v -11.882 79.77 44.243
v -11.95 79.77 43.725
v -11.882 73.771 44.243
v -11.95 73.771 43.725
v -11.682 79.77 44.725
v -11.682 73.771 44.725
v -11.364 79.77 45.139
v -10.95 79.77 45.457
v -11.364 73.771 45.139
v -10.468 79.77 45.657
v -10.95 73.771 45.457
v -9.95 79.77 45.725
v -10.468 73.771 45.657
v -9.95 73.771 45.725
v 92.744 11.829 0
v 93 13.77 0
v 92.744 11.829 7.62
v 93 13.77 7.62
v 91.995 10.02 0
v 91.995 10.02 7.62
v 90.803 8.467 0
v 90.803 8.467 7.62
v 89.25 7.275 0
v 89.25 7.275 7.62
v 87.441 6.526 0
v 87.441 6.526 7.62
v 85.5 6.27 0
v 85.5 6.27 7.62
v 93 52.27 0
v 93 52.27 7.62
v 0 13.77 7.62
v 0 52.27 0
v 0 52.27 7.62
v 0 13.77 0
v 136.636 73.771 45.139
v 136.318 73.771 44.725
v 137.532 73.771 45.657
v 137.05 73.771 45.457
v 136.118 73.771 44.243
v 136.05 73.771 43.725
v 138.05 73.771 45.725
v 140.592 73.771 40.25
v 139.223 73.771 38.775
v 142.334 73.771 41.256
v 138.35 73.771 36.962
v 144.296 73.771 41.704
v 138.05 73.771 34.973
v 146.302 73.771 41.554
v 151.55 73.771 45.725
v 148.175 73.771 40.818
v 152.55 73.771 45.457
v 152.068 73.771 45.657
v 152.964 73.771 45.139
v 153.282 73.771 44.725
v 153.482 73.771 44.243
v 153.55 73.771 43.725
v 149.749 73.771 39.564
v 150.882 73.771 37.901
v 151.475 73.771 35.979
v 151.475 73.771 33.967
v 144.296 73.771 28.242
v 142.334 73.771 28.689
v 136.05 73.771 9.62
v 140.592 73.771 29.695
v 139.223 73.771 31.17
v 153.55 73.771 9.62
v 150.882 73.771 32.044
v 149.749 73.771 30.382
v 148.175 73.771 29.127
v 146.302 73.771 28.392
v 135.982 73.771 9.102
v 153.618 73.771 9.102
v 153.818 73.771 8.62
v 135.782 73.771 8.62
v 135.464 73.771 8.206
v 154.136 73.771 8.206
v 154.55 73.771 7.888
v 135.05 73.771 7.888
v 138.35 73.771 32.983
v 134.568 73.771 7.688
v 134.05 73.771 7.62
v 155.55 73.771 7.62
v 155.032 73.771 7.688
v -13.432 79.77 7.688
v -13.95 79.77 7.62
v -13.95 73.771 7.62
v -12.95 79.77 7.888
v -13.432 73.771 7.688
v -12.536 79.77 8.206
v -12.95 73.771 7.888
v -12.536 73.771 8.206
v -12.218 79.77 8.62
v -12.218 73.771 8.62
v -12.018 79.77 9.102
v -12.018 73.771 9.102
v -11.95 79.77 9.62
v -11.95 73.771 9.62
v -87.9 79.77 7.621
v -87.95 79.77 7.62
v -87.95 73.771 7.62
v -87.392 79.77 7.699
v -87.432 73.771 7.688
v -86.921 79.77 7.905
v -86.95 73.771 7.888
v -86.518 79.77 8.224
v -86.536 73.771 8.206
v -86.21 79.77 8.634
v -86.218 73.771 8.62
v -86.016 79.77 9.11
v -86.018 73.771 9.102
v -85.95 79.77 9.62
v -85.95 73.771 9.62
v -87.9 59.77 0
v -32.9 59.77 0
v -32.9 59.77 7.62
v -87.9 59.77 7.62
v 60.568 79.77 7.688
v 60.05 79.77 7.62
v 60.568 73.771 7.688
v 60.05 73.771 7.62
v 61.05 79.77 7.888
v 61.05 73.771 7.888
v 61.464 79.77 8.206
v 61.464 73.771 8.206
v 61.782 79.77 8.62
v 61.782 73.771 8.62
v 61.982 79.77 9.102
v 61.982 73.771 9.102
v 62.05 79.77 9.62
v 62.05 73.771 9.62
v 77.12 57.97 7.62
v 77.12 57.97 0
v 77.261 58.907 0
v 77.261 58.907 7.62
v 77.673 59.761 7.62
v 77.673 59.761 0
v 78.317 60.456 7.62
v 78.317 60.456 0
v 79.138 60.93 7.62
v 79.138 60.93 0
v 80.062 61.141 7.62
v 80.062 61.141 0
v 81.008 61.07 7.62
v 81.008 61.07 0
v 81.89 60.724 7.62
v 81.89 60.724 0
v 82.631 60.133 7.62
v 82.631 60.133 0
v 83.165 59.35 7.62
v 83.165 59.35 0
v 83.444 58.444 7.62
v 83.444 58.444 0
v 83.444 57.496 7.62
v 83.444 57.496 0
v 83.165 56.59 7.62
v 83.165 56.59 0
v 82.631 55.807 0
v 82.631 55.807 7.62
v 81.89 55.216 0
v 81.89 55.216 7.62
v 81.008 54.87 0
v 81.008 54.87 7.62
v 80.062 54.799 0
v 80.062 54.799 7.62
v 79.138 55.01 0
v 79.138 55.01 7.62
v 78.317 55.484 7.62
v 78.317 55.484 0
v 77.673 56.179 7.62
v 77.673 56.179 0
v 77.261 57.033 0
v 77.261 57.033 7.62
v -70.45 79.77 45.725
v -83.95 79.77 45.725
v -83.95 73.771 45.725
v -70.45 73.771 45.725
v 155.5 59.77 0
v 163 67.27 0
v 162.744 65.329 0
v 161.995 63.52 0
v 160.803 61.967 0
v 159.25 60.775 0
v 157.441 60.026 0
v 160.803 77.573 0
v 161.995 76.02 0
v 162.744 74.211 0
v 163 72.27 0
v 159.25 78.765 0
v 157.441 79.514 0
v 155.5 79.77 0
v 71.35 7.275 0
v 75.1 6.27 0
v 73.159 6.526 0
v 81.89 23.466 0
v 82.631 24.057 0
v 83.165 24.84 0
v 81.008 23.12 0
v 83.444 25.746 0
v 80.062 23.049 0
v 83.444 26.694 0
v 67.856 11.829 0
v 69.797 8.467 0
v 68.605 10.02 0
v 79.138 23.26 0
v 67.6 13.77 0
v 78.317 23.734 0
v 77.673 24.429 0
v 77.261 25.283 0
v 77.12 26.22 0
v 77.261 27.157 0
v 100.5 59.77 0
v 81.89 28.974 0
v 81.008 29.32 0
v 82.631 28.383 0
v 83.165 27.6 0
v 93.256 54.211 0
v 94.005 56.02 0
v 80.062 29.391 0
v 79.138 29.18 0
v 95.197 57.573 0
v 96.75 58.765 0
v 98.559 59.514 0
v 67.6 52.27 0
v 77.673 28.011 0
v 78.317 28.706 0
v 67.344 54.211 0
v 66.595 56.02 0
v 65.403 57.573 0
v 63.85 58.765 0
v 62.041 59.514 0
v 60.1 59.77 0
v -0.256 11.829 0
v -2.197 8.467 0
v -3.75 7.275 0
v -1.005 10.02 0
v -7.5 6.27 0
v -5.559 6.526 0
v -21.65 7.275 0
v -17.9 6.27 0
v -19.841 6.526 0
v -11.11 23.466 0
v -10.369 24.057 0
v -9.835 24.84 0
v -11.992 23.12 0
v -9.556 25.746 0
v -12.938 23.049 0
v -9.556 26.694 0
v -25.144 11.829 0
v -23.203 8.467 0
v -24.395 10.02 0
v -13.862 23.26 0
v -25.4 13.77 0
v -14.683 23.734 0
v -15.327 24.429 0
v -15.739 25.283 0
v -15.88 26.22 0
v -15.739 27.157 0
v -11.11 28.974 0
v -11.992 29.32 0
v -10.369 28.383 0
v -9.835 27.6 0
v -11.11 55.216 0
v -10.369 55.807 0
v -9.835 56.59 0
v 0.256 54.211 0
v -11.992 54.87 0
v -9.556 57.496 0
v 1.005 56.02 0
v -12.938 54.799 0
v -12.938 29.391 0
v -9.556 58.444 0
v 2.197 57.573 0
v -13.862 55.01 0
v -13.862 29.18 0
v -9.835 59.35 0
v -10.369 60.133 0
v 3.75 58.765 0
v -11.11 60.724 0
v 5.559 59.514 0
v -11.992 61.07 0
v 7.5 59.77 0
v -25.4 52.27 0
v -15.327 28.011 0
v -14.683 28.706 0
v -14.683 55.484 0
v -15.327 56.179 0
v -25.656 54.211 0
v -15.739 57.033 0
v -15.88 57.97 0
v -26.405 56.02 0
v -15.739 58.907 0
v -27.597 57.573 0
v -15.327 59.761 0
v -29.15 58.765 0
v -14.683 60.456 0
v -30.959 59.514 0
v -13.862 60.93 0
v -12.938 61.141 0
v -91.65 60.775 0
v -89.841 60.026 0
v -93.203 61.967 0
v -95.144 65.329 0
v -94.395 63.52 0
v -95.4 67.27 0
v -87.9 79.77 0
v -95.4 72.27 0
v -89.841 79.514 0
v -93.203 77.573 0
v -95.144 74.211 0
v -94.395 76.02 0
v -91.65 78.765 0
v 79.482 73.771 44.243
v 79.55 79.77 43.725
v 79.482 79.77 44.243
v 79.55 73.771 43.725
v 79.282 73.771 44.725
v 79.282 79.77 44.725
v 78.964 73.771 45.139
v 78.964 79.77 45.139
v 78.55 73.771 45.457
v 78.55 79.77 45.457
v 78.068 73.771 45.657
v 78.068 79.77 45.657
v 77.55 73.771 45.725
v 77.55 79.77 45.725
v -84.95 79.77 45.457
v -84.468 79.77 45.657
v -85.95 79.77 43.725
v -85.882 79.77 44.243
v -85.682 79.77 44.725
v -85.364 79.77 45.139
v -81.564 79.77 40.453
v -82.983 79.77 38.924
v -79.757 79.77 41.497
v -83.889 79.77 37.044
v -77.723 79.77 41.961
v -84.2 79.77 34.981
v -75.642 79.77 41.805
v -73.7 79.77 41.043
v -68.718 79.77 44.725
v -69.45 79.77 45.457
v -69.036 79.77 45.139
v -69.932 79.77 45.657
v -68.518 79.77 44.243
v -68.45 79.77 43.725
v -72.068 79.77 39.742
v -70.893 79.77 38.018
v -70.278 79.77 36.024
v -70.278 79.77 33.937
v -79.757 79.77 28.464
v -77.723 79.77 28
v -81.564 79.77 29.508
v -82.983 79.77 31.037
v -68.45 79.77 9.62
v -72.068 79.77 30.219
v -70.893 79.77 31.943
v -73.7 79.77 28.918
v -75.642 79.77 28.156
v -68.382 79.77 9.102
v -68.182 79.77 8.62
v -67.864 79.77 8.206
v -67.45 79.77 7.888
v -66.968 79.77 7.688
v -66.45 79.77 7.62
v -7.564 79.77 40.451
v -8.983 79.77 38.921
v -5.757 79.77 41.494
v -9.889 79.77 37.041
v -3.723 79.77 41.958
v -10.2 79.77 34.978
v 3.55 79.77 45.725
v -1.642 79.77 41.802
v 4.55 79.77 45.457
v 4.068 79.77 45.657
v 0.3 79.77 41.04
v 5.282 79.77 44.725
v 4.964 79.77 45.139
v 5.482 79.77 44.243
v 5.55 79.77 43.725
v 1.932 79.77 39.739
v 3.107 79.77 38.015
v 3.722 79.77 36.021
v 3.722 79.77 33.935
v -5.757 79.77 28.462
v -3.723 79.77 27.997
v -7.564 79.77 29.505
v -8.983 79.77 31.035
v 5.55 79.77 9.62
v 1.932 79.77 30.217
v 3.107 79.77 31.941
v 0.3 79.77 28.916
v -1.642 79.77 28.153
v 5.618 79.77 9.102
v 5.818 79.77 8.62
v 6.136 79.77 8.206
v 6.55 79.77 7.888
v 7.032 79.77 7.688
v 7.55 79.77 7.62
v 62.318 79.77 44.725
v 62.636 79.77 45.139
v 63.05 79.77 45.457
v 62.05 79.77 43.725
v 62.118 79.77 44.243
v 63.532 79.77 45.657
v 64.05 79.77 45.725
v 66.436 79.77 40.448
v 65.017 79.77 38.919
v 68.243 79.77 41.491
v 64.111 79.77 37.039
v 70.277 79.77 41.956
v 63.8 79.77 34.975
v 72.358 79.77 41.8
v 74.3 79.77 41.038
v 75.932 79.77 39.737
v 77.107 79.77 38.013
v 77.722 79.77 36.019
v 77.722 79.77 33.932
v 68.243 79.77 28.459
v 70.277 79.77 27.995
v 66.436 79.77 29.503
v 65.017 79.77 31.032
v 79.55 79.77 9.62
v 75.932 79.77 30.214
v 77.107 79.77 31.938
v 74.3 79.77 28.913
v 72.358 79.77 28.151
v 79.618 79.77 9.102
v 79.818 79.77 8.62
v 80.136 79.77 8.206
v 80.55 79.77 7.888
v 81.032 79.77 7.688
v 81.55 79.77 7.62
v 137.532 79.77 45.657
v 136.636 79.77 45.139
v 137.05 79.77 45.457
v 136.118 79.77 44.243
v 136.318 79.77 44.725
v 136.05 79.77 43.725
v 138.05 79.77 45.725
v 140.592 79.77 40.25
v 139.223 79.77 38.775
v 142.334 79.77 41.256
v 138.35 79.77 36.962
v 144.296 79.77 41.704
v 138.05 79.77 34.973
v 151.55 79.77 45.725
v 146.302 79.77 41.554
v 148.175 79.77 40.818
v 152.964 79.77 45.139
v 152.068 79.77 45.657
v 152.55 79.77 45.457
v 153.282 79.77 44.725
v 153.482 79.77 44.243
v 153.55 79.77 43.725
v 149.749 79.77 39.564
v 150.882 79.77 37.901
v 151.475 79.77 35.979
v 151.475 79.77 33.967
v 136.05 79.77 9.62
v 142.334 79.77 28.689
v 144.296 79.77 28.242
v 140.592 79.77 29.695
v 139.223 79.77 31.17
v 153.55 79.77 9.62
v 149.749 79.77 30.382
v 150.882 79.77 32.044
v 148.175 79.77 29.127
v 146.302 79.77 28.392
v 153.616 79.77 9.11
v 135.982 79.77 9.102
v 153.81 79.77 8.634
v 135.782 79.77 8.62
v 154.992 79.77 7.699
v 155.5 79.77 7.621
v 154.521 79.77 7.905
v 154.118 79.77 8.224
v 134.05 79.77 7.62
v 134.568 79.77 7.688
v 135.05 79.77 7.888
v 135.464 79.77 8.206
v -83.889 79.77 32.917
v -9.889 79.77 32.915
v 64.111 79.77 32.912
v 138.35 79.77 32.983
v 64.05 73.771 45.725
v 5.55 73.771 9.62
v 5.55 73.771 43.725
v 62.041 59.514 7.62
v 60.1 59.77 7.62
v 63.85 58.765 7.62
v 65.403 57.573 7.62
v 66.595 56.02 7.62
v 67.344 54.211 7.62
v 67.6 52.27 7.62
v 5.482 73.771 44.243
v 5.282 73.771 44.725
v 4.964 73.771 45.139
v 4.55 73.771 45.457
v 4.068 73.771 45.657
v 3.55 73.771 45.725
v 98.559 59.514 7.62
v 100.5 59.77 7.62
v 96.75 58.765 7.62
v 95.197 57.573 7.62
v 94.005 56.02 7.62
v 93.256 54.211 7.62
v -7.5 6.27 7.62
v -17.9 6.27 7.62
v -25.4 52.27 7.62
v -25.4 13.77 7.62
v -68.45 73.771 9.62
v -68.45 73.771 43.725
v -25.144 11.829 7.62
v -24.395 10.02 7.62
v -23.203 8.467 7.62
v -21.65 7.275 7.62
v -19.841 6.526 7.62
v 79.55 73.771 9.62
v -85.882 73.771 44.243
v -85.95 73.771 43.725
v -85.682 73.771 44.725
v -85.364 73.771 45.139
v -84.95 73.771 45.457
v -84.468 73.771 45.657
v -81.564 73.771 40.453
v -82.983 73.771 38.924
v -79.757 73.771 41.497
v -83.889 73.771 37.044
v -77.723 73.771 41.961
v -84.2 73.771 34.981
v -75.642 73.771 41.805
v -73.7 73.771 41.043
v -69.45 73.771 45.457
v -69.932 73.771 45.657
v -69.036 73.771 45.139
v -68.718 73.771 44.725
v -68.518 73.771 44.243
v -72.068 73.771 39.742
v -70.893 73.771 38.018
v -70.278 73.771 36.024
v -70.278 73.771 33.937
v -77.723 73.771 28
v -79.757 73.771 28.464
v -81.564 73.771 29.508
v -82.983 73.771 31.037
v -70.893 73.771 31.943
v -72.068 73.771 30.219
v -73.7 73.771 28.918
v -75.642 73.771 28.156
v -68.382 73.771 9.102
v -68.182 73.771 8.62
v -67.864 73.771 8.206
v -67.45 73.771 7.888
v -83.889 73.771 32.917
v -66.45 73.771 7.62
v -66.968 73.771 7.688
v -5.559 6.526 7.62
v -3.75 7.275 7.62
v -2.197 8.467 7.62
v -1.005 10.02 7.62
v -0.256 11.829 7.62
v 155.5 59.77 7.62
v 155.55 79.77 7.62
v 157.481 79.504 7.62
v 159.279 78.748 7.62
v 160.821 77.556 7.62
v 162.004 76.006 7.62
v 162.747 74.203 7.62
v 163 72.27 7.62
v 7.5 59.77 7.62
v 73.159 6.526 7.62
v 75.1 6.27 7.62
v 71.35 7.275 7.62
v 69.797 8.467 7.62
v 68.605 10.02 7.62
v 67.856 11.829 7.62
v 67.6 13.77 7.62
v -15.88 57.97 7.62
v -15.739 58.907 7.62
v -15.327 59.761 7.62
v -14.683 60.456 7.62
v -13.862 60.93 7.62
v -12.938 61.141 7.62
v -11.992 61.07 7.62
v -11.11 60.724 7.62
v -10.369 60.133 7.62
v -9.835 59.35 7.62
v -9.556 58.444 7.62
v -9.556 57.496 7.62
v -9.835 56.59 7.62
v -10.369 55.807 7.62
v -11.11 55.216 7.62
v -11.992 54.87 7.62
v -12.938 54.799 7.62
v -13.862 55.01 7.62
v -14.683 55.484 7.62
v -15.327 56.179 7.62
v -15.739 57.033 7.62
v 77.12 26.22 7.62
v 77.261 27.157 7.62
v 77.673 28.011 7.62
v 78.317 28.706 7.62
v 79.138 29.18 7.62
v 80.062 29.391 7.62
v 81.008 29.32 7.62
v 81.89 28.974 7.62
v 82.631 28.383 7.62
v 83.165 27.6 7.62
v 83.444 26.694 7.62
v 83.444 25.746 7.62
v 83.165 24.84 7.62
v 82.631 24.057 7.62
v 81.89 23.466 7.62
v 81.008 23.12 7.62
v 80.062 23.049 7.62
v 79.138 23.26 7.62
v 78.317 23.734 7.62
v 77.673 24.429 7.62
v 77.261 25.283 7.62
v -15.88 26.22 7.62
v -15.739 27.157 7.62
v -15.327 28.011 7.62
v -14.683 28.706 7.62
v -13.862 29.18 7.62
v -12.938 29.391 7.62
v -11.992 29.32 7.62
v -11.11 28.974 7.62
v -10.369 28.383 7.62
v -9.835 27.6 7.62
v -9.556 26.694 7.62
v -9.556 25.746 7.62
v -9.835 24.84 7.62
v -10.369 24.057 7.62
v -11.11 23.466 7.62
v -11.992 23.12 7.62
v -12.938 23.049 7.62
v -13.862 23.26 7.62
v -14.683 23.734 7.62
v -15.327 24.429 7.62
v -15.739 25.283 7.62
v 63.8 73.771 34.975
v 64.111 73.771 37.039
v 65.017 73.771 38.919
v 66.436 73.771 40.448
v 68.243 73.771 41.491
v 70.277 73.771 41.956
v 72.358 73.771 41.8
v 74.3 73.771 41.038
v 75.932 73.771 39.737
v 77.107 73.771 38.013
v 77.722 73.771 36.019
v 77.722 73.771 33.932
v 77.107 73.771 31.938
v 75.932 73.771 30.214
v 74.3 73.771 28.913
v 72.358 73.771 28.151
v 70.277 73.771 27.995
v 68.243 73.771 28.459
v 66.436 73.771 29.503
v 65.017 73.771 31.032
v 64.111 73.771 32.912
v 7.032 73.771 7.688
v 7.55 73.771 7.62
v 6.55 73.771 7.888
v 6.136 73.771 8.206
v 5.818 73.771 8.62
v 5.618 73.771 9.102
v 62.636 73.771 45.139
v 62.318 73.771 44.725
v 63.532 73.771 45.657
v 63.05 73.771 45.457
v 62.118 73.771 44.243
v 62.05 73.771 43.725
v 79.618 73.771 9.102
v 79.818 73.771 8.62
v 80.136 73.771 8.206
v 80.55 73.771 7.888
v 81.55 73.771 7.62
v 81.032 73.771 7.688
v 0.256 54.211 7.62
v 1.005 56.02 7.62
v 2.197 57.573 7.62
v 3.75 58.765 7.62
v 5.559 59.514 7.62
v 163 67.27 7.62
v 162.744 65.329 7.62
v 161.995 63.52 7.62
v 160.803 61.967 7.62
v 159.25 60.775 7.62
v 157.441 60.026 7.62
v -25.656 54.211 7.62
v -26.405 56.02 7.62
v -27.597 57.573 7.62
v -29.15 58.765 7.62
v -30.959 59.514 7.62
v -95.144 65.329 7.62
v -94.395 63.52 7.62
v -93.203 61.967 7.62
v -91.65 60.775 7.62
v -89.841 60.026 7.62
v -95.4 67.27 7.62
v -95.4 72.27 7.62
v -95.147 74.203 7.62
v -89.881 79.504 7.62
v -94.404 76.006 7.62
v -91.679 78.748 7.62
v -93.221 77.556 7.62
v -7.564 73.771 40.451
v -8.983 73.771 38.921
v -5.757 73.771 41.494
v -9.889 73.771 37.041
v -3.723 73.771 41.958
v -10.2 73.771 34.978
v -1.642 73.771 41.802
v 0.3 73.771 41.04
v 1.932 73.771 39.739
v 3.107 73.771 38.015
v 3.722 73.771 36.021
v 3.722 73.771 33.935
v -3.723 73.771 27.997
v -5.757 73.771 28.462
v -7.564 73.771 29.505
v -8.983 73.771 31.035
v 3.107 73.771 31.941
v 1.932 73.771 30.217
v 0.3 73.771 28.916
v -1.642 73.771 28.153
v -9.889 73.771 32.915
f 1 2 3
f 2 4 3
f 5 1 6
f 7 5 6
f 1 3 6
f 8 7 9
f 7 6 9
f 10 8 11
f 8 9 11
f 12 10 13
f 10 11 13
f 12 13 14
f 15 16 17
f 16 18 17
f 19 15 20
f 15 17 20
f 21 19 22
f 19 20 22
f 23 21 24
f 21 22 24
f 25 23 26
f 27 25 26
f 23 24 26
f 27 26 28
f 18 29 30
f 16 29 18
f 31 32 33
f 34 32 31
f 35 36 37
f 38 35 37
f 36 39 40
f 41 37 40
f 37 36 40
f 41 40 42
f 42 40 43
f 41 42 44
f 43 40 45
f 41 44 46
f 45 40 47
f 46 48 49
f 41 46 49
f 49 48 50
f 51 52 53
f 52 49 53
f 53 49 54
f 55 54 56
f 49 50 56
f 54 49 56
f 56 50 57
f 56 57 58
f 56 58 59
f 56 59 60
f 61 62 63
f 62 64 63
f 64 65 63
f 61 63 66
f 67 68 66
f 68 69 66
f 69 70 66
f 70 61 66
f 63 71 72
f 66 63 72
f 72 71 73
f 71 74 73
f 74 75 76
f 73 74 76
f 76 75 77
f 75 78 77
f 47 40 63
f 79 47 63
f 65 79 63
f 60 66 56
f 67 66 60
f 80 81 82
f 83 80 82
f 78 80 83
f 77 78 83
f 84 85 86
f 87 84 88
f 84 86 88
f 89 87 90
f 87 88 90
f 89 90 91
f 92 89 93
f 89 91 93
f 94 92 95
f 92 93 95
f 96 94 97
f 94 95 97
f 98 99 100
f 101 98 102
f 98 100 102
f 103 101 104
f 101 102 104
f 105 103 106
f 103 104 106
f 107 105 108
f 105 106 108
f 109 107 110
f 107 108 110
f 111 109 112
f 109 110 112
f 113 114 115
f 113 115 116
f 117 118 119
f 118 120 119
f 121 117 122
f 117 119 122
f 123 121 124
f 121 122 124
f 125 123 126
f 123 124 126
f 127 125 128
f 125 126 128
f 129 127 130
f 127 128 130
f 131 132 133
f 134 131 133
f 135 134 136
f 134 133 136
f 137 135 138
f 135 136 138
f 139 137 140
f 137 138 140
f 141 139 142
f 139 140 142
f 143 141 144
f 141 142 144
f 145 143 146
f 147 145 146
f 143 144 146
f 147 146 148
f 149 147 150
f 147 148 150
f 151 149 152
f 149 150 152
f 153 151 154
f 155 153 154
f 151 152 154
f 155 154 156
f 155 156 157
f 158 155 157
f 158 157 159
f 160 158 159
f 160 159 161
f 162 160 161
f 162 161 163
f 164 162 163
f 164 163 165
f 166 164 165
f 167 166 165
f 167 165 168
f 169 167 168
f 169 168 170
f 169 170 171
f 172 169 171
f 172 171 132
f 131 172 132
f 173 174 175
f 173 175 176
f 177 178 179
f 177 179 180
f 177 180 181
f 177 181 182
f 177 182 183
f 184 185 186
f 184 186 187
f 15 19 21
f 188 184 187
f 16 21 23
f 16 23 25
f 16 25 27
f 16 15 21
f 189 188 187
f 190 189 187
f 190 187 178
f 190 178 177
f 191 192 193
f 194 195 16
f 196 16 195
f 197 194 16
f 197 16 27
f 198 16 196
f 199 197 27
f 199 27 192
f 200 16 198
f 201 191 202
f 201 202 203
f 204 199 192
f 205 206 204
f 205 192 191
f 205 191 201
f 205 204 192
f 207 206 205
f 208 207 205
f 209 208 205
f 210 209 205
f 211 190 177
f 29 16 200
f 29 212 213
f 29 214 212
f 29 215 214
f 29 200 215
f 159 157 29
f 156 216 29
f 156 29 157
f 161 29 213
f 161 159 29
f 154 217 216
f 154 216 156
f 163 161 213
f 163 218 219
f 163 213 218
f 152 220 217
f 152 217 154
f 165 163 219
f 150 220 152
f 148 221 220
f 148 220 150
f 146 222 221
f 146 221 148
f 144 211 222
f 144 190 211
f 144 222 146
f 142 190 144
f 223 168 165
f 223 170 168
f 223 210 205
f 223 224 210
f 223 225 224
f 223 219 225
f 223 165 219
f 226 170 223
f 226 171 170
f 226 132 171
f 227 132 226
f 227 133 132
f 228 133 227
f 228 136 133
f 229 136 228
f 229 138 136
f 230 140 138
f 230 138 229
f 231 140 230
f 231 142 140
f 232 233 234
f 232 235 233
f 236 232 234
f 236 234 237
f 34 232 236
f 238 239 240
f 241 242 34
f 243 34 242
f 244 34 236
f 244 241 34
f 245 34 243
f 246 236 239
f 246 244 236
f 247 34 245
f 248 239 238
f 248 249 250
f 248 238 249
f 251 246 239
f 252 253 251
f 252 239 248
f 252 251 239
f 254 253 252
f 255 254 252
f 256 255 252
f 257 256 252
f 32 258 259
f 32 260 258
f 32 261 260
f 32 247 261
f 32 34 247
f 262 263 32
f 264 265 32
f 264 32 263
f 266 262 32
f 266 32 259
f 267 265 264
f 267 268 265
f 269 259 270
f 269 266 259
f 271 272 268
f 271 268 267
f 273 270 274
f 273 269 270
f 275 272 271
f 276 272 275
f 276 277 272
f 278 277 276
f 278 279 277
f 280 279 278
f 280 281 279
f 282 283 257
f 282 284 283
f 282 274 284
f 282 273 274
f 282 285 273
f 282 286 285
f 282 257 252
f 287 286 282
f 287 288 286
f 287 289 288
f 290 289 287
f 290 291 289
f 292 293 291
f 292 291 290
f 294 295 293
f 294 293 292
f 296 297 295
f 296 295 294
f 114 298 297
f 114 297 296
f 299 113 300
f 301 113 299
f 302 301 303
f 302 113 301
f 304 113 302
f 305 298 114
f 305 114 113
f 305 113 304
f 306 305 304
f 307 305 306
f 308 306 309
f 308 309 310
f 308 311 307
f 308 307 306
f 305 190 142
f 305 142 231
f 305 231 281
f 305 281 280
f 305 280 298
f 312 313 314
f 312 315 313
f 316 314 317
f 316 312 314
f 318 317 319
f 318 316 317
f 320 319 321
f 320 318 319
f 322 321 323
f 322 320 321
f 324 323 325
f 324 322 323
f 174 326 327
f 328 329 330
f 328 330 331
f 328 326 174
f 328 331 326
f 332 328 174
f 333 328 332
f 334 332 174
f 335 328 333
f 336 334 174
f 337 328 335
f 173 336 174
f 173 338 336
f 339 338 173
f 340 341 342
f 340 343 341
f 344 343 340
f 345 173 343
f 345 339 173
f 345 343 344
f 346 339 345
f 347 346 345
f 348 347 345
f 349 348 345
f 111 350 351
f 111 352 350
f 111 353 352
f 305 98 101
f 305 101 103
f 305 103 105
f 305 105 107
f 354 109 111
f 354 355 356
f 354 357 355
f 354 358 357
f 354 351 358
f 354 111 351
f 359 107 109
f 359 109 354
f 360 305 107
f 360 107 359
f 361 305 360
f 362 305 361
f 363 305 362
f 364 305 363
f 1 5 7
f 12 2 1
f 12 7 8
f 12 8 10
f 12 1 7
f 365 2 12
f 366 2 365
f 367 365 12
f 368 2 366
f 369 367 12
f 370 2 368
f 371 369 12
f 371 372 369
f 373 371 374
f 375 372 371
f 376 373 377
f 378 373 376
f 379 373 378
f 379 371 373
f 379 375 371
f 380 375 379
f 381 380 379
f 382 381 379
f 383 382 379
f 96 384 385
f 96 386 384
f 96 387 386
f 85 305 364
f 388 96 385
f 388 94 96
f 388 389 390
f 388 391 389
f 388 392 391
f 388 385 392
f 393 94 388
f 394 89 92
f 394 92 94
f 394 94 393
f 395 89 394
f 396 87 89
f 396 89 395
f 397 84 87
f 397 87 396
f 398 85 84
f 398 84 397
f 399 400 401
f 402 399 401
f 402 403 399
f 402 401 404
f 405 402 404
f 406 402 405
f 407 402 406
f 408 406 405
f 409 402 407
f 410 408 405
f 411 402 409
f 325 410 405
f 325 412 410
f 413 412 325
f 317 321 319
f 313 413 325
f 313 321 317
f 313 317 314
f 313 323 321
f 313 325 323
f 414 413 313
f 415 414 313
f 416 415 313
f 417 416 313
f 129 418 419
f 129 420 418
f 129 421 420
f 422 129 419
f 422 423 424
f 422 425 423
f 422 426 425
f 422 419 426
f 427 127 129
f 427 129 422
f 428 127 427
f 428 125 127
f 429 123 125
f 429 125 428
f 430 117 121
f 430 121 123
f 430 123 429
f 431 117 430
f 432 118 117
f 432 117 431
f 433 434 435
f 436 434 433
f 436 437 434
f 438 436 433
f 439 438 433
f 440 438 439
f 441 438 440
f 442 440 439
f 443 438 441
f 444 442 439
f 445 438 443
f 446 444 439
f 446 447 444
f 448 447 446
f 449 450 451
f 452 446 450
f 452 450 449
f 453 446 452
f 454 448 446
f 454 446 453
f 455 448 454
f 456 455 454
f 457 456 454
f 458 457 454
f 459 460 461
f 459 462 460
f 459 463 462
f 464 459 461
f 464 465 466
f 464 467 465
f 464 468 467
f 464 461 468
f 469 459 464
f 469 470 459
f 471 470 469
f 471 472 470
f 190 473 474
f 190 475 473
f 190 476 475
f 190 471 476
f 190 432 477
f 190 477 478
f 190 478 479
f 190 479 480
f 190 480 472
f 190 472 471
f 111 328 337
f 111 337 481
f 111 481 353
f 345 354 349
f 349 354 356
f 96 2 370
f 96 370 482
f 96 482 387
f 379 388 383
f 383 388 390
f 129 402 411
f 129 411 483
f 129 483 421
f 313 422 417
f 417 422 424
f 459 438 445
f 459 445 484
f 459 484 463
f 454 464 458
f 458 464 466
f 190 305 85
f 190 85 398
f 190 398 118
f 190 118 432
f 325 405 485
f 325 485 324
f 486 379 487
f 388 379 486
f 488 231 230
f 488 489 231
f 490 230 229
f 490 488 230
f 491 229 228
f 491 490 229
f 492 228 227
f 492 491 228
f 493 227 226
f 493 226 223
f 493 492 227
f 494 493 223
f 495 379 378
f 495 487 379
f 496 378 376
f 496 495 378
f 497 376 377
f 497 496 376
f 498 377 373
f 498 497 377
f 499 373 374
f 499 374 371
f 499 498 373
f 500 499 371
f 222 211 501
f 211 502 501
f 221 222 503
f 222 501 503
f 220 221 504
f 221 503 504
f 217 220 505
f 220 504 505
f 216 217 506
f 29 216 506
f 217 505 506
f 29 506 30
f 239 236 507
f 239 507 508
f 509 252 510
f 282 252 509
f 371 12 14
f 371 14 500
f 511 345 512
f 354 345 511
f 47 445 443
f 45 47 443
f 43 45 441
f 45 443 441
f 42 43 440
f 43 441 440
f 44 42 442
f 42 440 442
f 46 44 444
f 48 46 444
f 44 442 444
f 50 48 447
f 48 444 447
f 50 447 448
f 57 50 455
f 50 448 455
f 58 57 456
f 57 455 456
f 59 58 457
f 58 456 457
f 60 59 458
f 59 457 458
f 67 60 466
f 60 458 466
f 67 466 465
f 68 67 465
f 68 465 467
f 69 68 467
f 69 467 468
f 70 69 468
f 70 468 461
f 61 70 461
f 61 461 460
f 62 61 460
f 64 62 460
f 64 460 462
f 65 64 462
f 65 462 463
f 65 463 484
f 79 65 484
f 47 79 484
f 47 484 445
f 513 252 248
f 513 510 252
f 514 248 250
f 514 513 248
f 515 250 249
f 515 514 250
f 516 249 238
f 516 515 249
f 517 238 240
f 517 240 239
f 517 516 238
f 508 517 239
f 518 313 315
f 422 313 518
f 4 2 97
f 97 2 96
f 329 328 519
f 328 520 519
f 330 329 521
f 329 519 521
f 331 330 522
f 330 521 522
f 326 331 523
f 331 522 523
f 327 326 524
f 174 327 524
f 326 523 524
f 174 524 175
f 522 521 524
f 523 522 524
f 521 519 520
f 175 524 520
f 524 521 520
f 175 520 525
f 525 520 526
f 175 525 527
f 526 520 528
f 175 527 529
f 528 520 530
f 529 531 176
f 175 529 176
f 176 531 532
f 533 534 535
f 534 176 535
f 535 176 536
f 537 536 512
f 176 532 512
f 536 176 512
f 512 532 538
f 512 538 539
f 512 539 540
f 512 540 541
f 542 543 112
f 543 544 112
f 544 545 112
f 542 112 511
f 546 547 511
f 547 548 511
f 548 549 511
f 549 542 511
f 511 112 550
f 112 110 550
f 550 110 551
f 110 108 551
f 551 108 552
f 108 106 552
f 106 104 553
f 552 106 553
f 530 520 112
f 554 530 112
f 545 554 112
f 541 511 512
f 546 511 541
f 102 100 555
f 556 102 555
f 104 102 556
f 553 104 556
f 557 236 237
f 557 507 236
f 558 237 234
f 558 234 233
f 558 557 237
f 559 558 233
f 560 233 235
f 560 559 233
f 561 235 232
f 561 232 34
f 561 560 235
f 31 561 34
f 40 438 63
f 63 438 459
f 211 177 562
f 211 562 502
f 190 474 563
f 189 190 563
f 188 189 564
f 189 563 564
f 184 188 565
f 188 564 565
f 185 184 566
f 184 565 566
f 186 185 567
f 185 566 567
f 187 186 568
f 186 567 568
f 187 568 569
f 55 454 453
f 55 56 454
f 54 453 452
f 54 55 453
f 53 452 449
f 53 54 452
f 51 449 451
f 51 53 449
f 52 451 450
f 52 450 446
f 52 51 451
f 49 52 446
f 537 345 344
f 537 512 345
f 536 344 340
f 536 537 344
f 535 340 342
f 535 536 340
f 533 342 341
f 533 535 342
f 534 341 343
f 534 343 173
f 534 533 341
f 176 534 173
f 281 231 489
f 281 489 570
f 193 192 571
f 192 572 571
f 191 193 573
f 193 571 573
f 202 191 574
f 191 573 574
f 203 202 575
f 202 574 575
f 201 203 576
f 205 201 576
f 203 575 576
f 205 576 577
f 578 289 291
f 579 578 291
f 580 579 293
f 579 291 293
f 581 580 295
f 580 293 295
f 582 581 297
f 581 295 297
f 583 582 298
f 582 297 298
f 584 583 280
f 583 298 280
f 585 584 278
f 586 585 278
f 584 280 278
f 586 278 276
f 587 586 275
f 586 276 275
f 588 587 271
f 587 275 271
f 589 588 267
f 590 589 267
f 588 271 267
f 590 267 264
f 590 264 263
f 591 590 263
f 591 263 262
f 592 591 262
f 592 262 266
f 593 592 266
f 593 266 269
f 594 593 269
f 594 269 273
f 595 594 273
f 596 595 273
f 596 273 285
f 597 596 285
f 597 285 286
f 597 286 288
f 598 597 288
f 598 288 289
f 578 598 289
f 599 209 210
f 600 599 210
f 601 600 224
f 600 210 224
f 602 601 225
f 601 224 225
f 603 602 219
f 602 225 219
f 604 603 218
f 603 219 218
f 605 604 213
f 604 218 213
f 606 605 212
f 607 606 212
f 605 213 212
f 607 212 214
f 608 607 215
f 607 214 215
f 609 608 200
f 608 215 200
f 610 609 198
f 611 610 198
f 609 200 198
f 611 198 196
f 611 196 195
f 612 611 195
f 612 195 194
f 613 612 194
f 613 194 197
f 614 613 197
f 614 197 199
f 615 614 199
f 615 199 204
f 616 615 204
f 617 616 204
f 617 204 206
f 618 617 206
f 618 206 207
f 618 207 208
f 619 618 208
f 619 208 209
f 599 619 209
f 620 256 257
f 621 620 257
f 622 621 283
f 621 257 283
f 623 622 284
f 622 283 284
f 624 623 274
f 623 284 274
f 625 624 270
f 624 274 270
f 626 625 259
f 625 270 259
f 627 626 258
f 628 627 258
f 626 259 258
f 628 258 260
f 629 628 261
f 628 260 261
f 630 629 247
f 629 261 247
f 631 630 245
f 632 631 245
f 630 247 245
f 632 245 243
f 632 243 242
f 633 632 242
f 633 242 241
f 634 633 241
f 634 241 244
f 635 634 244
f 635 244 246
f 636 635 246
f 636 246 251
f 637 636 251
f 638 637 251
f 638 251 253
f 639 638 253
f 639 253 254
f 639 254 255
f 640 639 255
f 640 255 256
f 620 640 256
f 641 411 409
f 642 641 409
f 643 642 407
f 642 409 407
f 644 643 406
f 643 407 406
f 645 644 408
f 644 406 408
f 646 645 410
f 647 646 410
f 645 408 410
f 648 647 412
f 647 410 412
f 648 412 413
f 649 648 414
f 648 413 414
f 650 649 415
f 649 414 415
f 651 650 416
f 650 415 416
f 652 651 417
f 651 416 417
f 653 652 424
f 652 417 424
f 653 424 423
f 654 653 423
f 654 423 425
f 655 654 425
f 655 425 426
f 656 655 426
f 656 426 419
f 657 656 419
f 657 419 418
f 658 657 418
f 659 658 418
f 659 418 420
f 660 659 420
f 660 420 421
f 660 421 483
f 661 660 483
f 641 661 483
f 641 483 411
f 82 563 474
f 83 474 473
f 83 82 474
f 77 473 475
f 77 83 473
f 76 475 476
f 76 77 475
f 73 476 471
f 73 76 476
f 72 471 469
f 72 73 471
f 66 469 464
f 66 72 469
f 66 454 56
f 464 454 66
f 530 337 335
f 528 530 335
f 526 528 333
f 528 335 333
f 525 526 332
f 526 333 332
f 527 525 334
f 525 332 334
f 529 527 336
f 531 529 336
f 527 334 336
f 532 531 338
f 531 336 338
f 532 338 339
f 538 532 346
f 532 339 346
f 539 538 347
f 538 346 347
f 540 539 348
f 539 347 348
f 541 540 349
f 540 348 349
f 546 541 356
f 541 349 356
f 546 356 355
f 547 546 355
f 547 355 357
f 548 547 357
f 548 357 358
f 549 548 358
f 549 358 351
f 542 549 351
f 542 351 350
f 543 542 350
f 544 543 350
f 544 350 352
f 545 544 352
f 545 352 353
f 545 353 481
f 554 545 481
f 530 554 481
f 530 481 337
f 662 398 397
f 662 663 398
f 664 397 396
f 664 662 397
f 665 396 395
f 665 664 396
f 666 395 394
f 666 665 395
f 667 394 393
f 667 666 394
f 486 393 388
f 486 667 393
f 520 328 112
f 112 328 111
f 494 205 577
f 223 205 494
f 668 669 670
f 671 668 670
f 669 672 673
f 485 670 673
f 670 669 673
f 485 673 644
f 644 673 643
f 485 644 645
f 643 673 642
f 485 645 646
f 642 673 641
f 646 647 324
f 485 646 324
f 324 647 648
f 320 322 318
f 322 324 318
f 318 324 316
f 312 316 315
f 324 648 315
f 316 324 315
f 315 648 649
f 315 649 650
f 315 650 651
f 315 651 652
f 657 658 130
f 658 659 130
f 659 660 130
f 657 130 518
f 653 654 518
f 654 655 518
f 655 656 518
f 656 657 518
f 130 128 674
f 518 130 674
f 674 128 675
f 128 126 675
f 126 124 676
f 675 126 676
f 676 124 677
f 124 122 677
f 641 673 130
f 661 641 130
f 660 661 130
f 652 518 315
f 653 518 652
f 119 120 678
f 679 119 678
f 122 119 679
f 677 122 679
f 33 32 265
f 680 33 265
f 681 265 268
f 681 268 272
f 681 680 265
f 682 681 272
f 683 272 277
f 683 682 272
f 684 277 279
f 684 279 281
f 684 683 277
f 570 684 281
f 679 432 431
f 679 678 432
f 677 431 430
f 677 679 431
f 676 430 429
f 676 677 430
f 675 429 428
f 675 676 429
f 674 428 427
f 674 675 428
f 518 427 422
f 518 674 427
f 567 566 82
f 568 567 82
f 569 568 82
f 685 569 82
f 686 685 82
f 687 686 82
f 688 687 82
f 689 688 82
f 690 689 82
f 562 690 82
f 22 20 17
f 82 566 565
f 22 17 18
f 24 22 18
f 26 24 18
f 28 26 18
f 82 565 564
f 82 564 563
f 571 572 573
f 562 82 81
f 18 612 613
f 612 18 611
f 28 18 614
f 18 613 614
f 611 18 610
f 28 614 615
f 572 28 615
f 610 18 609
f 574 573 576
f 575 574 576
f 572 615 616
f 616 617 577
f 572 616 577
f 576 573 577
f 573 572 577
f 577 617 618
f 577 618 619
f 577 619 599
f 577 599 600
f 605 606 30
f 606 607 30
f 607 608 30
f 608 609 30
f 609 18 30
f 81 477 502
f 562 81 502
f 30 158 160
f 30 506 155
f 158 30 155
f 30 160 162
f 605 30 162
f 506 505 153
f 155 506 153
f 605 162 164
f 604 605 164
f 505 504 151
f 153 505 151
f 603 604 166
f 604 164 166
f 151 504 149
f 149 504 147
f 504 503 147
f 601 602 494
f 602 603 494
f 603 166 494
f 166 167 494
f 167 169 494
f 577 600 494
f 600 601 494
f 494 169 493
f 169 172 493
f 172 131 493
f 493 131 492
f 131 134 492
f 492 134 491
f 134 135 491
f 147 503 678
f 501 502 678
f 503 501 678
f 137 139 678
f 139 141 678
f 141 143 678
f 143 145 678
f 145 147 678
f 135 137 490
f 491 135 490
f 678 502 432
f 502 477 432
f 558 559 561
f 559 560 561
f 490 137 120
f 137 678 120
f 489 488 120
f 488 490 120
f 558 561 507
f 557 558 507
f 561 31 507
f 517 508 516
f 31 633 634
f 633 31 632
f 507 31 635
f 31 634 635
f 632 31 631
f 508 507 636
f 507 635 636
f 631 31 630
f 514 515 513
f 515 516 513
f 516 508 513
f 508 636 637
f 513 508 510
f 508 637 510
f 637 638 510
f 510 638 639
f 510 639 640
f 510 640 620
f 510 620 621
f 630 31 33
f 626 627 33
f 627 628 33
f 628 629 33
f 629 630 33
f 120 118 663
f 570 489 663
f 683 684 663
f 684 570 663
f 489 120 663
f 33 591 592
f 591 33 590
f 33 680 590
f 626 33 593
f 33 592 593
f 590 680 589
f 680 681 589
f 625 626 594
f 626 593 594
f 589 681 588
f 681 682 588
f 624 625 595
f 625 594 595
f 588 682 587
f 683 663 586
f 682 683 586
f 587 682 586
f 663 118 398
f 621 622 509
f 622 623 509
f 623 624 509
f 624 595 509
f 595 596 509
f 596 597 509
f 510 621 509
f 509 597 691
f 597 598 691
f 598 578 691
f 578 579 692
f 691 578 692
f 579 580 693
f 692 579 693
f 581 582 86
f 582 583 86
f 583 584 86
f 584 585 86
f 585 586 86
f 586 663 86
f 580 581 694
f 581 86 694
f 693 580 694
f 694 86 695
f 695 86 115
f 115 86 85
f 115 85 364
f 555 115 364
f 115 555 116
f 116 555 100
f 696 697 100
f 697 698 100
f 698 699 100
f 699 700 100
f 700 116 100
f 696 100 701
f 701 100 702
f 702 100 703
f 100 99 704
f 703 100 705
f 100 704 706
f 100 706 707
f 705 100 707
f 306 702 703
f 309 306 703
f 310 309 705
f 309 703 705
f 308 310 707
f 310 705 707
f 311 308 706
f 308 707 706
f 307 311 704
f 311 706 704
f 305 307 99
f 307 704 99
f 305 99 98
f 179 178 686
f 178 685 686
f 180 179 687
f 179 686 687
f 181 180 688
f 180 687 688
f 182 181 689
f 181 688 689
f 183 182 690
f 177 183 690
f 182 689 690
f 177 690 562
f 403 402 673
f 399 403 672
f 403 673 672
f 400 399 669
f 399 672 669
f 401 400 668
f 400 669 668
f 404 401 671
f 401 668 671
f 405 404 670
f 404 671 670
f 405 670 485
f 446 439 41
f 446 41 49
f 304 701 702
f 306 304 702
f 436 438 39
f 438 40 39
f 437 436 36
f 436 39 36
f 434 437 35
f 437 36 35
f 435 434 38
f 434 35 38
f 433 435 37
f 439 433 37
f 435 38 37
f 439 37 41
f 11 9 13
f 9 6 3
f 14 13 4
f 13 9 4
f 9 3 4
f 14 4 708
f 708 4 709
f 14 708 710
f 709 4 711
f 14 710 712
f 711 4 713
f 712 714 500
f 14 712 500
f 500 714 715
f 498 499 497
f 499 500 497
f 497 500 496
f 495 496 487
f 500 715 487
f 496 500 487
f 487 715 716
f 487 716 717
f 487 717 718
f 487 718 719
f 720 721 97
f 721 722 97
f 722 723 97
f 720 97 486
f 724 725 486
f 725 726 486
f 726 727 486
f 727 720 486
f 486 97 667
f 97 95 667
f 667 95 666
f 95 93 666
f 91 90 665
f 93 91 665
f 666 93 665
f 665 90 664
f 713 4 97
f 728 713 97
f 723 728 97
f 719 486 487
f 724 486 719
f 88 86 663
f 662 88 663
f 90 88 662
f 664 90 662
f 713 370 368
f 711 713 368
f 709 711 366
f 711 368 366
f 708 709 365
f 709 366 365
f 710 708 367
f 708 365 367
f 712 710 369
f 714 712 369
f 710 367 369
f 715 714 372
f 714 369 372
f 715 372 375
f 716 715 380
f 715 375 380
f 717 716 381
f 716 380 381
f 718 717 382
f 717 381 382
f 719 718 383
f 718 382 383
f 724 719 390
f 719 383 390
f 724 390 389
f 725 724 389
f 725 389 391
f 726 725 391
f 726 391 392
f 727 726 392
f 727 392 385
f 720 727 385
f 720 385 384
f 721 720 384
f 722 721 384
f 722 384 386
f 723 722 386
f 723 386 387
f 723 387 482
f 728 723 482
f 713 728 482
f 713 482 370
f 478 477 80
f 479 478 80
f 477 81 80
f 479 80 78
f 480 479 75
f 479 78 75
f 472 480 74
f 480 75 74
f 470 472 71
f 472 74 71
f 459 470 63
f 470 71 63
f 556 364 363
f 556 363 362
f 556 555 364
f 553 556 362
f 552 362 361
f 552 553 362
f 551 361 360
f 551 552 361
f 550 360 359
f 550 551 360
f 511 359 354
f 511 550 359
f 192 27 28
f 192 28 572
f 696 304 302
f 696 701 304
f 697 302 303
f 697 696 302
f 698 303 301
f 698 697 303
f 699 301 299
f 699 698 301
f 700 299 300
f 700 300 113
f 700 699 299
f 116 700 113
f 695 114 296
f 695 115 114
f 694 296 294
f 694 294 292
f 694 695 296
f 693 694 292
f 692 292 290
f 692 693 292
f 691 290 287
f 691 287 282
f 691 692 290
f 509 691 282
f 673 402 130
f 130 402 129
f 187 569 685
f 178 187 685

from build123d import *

# Parameters (mm, degrees)
BOSS_EXTRUDE1_DEPTH = 7.62
SKETCH2_R           = 3.17999999
CUT_EXTRUDE1_DEPTH  = 45.72
SKETCH3_W           = 17.5
SKETCH3_H           = 38.105
BOSS_EXTRUDE2_DEPTH = 5.99948
FILLET1_R           = 7.5
SKETCH5_R           = 6.75
SKETCH5_R_2         = 7
CUT_EXTRUDE2_DEPTH  = 10
FILLET2_R           = 2


with BuildPart() as part:
    # Sketch1 → Boss-Extrude1 (new body)
    with BuildSketch(Plane.XY):
        Polygon((-95.4, 59.77), (-95.4, 79.77), (163, 79.77), (163, 59.77), (93, 59.77), (93, 6.27), (67.6, 6.27), (67.6, 59.77), (0, 59.77), (0, 6.27), (-25.4, 6.27), (-25.4, 59.77), align=None)
    extrude(amount=BOSS_EXTRUDE1_DEPTH)

    # Sketch2 → Cut-Extrude1 (cut)
    with BuildSketch(Plane(origin=(0, 0, 0), x_dir=(-1, 0, 0), z_dir=(0, 0, -1))):
        with Locations((-80.3, 57.97)):
            Circle(SKETCH2_R)
        with Locations((-80.3, 26.22)):
            Circle(SKETCH2_R)
        with Locations((12.7, 26.22)):
            Circle(SKETCH2_R)
        with Locations((12.7, 57.97)):
            Circle(SKETCH2_R)
    extrude(amount=-CUT_EXTRUDE1_DEPTH, mode=Mode.SUBTRACT)

    # Sketch3 → Boss-Extrude2 (add)
    with BuildSketch(Plane(origin=(0, 79.77, 0), x_dir=(1, 0, 0), z_dir=(0, 1, 0))):
        with Locations((144.8, -26.6725)):
            Rectangle(SKETCH3_W, SKETCH3_H)
        with Locations((-77.2, -26.6725)):
            Rectangle(SKETCH3_W, SKETCH3_H)
        with Locations((-3.2, -26.6725)):
            Rectangle(SKETCH3_W, SKETCH3_H)
        with Locations((70.8, -26.6725)):
            Rectangle(SKETCH3_W, SKETCH3_H)
    extrude(amount=-BOSS_EXTRUDE2_DEPTH)

    # Fillet1
    fillet1_edges = [part.edges().sort_by_distance(p)[0] for p in [
        (-95.4, 59.77, 3.81),
        (-95.4, 79.77, 3.81),
        (163, 79.77, 3.81),
        (163, 59.77, 3.81),
        (93, 59.77, 3.81),
        (93, 6.27, 3.81),
        (67.6, 6.27, 3.81),
        (67.6, 59.77, 3.81),
        (0, 59.77, 3.81),
        (0, 6.27, 3.81),
        (-25.4, 6.27, 3.81),
        (-25.4, 59.77, 3.81),
    ]]
    fillet(fillet1_edges, radius=FILLET1_R)

    # Sketch5 → Cut-Extrude2 (cut)
    with BuildSketch(Plane(origin=(0, 79.77, 0), x_dir=(1, 0, 0), z_dir=(0, 1, 0))):
        with Locations(Location((144.800446227, -34.97274241, 0), (0, 0, 180))):
            Circle(SKETCH5_R)
        with Locations(Location((70.800446272, -34.975332504, 0), (0, 0, 180))):
            Circle(SKETCH5_R_2)
        with Locations(Location((-3.199553683, -34.977922599, 0), (0, 0, 180))):
            Circle(SKETCH5_R_2)
        with Locations(Location((-77.199553637, -34.980512693, 0), (0, 0, 180))):
            Circle(SKETCH5_R_2)
    extrude(amount=-CUT_EXTRUDE2_DEPTH, mode=Mode.SUBTRACT)

    # Fillet2
    fillet2_edges = [part.edges().sort_by_distance(p)[0] for p in [
        (153.55, 76.77026, 7.62),
        (153.55, 76.77026, 45.725),
        (136.05, 76.77026, 45.725),
        (136.05, 76.77026, 7.62),
        (-85.95, 76.77026, 45.725),
        (-85.95, 76.77026, 7.62),
        (-68.45, 76.77026, 7.62),
        (-68.45, 76.77026, 45.725),
        (5.55, 76.77026, 7.62),
        (5.55, 76.77026, 45.725),
        (-11.95, 76.77026, 45.725),
        (-11.95, 76.77026, 7.62),
        (62.05, 76.77026, 7.62),
        (79.55, 76.77026, 7.62),
        (79.55, 76.77026, 45.725),
        (62.05, 76.77026, 45.725),
    ]]
    fillet(fillet2_edges, radius=FILLET2_R)


solid = part.part
